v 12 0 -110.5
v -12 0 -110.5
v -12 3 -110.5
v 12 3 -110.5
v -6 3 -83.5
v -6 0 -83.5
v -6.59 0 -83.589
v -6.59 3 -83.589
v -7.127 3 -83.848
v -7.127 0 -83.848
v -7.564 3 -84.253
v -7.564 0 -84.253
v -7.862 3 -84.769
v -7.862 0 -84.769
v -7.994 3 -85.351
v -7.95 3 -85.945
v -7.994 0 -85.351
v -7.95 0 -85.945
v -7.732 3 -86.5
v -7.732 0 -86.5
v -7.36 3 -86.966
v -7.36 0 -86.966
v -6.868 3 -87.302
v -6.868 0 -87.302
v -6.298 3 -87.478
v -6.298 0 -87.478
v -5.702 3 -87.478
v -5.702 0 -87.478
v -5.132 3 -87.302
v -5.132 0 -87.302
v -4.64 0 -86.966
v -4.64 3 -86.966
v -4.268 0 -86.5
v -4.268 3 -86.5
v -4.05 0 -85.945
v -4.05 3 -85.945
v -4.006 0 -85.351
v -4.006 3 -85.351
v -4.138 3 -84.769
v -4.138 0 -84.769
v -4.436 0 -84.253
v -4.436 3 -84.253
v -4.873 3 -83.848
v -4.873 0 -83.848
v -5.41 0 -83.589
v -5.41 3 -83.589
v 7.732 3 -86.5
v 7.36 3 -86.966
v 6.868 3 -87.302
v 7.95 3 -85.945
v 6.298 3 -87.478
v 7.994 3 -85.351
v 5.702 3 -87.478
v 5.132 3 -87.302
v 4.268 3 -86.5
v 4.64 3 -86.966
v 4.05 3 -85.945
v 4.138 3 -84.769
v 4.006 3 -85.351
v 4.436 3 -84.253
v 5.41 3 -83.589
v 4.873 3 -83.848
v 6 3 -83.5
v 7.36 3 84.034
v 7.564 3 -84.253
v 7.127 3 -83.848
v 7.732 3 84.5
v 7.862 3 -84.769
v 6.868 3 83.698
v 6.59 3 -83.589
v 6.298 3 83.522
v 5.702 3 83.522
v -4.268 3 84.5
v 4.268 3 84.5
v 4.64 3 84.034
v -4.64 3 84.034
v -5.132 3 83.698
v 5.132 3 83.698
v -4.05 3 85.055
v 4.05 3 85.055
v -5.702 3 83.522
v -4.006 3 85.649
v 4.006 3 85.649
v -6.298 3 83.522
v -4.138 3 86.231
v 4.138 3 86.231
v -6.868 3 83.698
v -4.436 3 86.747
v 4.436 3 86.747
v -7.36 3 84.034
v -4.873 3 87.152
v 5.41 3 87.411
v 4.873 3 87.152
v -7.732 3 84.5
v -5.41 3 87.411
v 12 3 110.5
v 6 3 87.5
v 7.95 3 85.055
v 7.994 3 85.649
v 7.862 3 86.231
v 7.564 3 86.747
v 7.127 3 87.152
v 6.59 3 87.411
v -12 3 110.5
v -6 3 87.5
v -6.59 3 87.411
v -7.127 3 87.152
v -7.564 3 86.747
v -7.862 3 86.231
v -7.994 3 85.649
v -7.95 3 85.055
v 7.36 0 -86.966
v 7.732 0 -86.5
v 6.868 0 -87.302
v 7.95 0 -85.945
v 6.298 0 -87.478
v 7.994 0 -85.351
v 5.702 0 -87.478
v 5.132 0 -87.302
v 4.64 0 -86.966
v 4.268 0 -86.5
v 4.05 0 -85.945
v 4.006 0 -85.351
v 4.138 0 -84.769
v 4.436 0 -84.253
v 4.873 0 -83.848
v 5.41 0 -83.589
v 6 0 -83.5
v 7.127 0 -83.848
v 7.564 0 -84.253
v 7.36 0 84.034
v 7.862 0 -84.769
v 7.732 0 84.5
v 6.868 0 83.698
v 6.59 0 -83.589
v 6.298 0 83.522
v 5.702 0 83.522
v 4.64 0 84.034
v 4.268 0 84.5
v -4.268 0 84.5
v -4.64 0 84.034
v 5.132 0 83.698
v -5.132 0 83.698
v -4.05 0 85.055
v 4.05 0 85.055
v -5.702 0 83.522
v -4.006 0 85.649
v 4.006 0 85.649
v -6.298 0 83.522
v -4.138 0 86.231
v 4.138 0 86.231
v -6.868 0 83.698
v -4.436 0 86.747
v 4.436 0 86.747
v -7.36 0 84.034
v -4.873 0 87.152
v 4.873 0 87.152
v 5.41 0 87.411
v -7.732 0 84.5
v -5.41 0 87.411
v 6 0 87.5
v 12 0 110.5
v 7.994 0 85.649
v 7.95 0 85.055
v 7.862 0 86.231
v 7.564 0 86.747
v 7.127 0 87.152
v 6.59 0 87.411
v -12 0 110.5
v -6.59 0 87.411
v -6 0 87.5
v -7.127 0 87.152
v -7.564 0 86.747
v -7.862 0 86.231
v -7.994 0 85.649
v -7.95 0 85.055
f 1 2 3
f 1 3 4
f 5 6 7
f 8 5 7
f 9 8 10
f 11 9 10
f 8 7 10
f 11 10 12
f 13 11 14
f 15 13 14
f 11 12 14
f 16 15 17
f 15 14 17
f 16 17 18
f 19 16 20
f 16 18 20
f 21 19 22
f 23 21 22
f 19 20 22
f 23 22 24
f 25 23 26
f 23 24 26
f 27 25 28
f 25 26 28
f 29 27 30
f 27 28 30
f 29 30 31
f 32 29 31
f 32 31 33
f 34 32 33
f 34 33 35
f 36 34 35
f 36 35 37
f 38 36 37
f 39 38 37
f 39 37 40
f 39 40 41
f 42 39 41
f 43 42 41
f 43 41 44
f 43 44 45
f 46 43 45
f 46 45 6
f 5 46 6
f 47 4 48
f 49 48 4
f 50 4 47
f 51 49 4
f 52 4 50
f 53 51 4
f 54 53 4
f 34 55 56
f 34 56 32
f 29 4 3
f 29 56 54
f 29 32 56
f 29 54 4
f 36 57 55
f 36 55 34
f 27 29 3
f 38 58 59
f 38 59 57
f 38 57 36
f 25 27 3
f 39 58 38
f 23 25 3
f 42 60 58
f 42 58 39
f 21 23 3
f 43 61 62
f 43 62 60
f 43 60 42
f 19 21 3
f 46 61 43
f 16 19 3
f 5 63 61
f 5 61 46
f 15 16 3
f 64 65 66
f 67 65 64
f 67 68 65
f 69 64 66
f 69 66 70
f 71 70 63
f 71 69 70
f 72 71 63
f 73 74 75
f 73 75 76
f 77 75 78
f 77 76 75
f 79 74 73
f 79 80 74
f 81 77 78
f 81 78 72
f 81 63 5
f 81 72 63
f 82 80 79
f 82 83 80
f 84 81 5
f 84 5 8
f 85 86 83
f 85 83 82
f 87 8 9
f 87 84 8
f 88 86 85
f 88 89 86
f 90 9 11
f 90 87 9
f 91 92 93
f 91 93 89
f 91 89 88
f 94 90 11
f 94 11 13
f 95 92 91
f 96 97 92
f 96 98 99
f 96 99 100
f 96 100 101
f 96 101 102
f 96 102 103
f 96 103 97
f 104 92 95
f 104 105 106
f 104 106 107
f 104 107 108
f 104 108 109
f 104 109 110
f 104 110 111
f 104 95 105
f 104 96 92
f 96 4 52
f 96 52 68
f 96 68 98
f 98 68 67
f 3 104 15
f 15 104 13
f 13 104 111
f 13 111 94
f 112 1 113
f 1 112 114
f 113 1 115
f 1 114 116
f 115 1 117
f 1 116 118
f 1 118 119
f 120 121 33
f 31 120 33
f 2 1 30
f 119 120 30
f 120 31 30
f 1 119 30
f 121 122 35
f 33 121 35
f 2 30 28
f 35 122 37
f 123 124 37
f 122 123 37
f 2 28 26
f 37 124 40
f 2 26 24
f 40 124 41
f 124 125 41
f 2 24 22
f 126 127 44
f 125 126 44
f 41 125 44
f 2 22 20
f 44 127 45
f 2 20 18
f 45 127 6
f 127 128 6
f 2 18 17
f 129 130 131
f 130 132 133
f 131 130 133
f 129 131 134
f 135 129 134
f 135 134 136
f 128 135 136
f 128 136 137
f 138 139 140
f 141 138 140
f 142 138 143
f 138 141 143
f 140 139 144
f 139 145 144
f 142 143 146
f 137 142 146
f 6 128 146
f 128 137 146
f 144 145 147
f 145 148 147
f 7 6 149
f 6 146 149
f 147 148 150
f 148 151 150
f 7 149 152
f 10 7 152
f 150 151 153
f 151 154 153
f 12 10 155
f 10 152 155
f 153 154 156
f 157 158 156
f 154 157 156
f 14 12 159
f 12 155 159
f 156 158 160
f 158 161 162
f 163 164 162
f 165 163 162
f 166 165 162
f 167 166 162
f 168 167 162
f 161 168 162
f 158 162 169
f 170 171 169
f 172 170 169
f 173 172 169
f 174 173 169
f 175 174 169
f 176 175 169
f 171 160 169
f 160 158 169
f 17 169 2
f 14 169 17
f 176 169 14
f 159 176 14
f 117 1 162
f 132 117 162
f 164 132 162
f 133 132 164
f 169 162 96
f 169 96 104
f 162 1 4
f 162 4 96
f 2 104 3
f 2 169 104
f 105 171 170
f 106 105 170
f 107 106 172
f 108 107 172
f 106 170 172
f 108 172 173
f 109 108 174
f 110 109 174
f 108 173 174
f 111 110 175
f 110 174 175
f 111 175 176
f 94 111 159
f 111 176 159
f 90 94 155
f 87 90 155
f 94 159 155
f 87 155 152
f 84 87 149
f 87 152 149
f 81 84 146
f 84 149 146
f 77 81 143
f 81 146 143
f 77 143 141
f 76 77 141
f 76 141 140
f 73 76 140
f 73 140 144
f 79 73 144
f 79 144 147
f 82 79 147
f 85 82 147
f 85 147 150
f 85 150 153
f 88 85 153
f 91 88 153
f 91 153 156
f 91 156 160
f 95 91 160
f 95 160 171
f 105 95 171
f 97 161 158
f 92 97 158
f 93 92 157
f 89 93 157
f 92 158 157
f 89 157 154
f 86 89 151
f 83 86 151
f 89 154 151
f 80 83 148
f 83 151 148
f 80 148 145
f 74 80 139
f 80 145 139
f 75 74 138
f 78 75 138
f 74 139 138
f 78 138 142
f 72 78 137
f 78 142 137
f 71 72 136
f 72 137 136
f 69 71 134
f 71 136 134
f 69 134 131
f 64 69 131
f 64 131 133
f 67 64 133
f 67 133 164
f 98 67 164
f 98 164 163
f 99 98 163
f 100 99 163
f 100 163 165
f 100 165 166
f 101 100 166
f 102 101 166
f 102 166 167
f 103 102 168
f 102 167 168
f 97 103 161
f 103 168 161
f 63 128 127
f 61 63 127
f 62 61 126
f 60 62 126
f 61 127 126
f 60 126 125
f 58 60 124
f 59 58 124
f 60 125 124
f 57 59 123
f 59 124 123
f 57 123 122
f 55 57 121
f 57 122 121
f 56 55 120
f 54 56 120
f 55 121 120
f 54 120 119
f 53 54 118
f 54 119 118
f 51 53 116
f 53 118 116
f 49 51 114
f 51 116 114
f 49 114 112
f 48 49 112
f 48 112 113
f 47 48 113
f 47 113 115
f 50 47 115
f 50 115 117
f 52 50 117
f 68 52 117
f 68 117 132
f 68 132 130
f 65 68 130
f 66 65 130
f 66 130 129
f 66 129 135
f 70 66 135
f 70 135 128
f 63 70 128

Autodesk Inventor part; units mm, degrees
ref_plane "YZ Plane" through (0, 0, 0) normal (1, 0, 0) x (0, 1, 0)
ref_plane "XZ Plane" through (0, 0, 0) normal (0, 1, 0) x (-1, 0, 0)
ref_plane "XY Plane" through (0, 0, 0) normal (0, 0, 1) x (1, 0, 0)
sketch "Sketch1" plane through (0, 0, 0) normal (0, 1, 0) x (-1, 0, 0)
  line L0 (-12, 110.5) -> (12, 110.5)
  line L1 (12, 110.5) -> (12, -110.5)
  line L2 (12, -110.5) -> (-12, -110.5)
  line L3 (-12, -110.5) -> (-12, 110.5)
  line L4 (-12, 110.5) -> (12, -110.5) construction
  line L5 (12, 110.5) -> (-12, -110.5) construction
  point P0 (0, 0)
  dimension "d0" = 24
  dimension "d1" = 221
extrude "Extrusion1" add sketch "Sketch1" along normal blind 3
sketch "Sketch2" plane through (0, 3, 0) normal (0, 1, 0) x (1, 0, 0)
  line L0 (12, -110.5) -> (12, 110.5) projected
  line L1 (-12, -110.5) -> (12, -110.5) projected
  point P0 (0, 0)
  point P1 (-6, -85.5)
  point P2 (6, -85.5)
  point P3 (-6, 85.5)
  point P4 (6, 85.5)
  dimension "d4" = 12
  dimension "d5" = 6
  dimension "d6" = 171
  dimension "d7" = 25
hole "Hole1" at (-6, 3, 85.5) at (6, 3, 85.5) at (-6, 3, -85.5) at (6, 3, -85.5) direction (0, -1, 0) diameter 4 depth 3
properties part number "213"
